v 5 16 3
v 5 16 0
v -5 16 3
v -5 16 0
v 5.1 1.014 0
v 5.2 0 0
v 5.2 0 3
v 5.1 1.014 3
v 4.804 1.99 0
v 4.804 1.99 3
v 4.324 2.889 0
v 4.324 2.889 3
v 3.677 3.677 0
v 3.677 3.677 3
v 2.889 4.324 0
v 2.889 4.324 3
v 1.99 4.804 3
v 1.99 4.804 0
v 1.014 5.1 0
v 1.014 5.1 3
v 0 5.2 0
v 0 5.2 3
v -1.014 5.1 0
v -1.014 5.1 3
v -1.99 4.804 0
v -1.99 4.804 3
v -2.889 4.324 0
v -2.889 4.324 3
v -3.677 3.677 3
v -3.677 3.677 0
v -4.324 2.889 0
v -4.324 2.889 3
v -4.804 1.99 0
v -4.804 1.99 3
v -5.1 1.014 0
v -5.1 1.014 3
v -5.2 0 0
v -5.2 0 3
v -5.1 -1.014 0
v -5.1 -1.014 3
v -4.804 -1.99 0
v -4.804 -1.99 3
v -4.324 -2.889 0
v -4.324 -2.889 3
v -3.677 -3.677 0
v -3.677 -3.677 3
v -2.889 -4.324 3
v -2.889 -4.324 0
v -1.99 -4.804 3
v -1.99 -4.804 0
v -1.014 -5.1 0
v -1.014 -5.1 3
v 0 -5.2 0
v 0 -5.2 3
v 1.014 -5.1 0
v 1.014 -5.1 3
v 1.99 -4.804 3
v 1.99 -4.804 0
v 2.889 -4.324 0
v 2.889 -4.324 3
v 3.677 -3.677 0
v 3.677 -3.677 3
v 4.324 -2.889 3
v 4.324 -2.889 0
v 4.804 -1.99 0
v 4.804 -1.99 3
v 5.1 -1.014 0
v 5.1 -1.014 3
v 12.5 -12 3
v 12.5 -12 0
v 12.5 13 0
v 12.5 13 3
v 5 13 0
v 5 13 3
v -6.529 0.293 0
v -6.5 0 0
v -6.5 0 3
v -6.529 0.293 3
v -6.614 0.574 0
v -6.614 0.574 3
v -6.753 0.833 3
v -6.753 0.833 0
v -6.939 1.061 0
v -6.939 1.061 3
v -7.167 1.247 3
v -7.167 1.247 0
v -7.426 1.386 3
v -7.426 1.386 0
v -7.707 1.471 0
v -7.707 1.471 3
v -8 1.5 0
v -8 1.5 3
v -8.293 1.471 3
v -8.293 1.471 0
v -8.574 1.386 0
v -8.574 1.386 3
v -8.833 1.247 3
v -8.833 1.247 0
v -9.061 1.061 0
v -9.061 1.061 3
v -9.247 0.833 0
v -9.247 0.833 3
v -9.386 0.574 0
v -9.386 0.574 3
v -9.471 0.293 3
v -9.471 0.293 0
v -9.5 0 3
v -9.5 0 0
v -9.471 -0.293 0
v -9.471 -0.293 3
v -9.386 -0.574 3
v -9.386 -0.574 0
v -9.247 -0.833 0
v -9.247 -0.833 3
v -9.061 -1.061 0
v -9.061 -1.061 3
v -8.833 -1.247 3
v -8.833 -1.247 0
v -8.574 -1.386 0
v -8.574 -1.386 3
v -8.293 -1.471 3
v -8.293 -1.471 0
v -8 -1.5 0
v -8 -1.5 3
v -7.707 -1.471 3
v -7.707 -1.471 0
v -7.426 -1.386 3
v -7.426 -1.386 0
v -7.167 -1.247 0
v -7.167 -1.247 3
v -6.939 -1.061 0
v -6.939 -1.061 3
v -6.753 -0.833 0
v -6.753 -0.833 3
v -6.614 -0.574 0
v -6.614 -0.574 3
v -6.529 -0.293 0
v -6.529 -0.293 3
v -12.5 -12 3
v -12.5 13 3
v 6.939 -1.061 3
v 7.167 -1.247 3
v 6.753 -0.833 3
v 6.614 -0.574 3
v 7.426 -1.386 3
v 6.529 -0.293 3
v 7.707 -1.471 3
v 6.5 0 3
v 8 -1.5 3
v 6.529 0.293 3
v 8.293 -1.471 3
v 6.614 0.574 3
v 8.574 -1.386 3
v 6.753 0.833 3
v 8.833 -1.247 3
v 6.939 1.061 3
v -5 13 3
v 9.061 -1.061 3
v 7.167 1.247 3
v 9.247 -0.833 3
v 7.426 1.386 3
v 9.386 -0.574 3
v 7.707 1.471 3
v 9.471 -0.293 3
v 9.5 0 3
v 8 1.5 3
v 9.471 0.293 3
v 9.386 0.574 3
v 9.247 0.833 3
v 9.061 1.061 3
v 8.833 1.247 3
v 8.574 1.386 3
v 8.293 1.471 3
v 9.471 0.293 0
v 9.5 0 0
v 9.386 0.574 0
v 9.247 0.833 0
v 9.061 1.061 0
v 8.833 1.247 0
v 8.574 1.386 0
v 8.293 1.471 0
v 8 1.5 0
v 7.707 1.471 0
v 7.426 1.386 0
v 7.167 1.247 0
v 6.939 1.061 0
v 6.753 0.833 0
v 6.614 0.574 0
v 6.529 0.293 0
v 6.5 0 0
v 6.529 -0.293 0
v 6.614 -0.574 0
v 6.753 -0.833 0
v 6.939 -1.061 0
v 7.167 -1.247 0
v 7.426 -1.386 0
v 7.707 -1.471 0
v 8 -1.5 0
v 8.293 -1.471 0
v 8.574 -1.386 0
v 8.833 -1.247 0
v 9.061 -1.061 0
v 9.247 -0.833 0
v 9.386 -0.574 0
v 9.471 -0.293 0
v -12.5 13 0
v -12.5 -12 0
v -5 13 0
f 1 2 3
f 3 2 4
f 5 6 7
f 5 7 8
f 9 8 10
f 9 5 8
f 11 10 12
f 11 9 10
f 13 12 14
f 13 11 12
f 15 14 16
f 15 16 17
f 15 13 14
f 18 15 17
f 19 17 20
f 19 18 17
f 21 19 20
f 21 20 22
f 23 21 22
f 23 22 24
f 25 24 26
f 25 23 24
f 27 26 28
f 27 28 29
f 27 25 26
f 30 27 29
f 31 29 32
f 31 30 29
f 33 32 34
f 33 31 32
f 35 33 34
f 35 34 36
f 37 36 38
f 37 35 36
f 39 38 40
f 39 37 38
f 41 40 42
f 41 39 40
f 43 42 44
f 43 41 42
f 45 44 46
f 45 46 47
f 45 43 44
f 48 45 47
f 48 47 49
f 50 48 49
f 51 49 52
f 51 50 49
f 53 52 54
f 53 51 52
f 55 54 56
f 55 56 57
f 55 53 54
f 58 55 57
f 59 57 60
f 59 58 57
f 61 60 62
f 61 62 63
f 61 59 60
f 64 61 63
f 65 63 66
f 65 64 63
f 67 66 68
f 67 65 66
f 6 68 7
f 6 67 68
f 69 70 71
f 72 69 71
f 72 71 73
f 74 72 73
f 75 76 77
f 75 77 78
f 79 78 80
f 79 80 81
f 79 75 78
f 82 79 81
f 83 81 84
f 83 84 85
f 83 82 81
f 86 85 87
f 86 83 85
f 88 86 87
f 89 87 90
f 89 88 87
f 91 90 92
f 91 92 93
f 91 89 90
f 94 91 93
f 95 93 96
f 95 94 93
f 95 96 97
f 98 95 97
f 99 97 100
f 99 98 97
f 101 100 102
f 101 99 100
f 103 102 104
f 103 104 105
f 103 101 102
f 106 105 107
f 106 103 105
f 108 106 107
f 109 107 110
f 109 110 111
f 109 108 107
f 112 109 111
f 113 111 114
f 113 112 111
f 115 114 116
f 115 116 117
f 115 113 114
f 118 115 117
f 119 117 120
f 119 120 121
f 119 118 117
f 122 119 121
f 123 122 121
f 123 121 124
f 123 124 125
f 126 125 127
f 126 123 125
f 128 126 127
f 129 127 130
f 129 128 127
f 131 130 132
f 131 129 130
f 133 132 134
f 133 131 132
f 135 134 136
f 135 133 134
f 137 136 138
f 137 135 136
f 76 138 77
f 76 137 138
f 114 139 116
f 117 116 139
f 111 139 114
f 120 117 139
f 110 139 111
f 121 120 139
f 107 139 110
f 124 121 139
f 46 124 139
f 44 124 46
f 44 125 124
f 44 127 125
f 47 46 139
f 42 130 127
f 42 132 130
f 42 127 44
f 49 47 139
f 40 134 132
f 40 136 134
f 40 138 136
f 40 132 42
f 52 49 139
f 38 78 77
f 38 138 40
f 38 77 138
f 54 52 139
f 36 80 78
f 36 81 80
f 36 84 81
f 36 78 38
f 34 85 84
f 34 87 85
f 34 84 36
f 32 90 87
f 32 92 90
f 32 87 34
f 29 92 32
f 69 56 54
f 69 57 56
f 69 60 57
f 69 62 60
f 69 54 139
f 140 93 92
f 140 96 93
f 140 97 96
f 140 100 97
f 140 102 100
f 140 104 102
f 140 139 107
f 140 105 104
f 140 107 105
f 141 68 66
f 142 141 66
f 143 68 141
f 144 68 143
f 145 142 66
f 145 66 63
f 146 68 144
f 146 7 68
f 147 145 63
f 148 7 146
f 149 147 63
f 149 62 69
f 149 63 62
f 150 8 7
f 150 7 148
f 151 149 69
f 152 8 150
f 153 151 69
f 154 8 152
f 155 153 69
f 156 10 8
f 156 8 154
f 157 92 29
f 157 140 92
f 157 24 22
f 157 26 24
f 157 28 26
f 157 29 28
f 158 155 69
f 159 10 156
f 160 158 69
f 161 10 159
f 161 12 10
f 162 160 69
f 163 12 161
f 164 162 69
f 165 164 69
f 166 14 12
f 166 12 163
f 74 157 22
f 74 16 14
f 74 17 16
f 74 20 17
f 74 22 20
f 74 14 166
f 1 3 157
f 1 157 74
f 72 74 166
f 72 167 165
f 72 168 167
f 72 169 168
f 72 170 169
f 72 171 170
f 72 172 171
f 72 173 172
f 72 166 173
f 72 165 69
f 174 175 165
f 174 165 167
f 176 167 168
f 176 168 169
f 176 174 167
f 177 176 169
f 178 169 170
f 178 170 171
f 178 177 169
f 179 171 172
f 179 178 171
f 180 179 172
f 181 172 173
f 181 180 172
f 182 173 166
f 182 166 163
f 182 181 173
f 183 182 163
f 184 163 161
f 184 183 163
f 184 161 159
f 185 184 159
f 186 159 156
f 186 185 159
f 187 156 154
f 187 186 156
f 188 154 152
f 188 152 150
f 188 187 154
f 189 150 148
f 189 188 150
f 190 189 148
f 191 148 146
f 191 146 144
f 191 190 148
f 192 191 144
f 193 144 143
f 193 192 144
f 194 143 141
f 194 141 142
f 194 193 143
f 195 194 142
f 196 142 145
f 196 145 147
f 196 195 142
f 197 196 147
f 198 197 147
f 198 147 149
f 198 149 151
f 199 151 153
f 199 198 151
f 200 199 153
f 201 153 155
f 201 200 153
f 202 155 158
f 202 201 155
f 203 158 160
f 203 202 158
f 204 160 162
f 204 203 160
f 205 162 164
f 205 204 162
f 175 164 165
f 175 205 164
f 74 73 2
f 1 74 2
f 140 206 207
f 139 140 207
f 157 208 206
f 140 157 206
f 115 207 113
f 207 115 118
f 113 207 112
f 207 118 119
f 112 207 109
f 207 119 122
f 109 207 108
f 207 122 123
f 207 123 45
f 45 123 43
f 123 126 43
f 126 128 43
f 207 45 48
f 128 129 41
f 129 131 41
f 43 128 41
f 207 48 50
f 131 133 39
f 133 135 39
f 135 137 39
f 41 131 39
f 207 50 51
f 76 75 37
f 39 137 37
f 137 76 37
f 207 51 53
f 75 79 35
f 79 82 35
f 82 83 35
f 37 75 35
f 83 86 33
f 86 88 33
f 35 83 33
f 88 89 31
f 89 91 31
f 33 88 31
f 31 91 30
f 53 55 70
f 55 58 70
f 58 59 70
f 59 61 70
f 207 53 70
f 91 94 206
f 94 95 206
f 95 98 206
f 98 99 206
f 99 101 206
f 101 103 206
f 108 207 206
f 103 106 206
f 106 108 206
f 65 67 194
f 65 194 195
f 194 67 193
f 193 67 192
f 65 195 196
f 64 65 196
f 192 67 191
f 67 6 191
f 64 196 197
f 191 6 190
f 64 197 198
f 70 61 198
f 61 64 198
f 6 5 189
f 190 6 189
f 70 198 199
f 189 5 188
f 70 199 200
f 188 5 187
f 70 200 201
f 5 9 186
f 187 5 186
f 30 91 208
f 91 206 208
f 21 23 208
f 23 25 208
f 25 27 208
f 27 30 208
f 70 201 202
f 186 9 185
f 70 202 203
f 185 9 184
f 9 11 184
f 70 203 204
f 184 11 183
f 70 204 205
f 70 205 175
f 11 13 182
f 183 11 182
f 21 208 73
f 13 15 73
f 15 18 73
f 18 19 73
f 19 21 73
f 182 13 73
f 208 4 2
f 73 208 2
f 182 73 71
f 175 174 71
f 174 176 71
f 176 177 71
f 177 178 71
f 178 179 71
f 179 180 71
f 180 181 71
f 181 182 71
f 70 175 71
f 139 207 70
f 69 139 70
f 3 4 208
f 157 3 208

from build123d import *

# Parameters (mm, degrees)
SKETCH1_R           = 5.2
SKETCH1_R_2         = 1.5
BOSS_EXTRUDE1_DEPTH = 3


with BuildPart() as part:
    # Sketch1 → Boss-Extrude1 (new body)
    with BuildSketch(Plane.XY):
        Polygon((-12.5, 13), (-12.5, -12), (12.5, -12), (12.5, 13), (5, 13), (5, 16), (-5, 16), (-5, 13), align=None)
        Circle(SKETCH1_R, mode=Mode.SUBTRACT)
        with Locations((-8, 0)):
            Circle(SKETCH1_R_2, mode=Mode.SUBTRACT)
        with Locations((8, 0)):
            Circle(SKETCH1_R_2, mode=Mode.SUBTRACT)
    extrude(amount=BOSS_EXTRUDE1_DEPTH)


solid = part.part
